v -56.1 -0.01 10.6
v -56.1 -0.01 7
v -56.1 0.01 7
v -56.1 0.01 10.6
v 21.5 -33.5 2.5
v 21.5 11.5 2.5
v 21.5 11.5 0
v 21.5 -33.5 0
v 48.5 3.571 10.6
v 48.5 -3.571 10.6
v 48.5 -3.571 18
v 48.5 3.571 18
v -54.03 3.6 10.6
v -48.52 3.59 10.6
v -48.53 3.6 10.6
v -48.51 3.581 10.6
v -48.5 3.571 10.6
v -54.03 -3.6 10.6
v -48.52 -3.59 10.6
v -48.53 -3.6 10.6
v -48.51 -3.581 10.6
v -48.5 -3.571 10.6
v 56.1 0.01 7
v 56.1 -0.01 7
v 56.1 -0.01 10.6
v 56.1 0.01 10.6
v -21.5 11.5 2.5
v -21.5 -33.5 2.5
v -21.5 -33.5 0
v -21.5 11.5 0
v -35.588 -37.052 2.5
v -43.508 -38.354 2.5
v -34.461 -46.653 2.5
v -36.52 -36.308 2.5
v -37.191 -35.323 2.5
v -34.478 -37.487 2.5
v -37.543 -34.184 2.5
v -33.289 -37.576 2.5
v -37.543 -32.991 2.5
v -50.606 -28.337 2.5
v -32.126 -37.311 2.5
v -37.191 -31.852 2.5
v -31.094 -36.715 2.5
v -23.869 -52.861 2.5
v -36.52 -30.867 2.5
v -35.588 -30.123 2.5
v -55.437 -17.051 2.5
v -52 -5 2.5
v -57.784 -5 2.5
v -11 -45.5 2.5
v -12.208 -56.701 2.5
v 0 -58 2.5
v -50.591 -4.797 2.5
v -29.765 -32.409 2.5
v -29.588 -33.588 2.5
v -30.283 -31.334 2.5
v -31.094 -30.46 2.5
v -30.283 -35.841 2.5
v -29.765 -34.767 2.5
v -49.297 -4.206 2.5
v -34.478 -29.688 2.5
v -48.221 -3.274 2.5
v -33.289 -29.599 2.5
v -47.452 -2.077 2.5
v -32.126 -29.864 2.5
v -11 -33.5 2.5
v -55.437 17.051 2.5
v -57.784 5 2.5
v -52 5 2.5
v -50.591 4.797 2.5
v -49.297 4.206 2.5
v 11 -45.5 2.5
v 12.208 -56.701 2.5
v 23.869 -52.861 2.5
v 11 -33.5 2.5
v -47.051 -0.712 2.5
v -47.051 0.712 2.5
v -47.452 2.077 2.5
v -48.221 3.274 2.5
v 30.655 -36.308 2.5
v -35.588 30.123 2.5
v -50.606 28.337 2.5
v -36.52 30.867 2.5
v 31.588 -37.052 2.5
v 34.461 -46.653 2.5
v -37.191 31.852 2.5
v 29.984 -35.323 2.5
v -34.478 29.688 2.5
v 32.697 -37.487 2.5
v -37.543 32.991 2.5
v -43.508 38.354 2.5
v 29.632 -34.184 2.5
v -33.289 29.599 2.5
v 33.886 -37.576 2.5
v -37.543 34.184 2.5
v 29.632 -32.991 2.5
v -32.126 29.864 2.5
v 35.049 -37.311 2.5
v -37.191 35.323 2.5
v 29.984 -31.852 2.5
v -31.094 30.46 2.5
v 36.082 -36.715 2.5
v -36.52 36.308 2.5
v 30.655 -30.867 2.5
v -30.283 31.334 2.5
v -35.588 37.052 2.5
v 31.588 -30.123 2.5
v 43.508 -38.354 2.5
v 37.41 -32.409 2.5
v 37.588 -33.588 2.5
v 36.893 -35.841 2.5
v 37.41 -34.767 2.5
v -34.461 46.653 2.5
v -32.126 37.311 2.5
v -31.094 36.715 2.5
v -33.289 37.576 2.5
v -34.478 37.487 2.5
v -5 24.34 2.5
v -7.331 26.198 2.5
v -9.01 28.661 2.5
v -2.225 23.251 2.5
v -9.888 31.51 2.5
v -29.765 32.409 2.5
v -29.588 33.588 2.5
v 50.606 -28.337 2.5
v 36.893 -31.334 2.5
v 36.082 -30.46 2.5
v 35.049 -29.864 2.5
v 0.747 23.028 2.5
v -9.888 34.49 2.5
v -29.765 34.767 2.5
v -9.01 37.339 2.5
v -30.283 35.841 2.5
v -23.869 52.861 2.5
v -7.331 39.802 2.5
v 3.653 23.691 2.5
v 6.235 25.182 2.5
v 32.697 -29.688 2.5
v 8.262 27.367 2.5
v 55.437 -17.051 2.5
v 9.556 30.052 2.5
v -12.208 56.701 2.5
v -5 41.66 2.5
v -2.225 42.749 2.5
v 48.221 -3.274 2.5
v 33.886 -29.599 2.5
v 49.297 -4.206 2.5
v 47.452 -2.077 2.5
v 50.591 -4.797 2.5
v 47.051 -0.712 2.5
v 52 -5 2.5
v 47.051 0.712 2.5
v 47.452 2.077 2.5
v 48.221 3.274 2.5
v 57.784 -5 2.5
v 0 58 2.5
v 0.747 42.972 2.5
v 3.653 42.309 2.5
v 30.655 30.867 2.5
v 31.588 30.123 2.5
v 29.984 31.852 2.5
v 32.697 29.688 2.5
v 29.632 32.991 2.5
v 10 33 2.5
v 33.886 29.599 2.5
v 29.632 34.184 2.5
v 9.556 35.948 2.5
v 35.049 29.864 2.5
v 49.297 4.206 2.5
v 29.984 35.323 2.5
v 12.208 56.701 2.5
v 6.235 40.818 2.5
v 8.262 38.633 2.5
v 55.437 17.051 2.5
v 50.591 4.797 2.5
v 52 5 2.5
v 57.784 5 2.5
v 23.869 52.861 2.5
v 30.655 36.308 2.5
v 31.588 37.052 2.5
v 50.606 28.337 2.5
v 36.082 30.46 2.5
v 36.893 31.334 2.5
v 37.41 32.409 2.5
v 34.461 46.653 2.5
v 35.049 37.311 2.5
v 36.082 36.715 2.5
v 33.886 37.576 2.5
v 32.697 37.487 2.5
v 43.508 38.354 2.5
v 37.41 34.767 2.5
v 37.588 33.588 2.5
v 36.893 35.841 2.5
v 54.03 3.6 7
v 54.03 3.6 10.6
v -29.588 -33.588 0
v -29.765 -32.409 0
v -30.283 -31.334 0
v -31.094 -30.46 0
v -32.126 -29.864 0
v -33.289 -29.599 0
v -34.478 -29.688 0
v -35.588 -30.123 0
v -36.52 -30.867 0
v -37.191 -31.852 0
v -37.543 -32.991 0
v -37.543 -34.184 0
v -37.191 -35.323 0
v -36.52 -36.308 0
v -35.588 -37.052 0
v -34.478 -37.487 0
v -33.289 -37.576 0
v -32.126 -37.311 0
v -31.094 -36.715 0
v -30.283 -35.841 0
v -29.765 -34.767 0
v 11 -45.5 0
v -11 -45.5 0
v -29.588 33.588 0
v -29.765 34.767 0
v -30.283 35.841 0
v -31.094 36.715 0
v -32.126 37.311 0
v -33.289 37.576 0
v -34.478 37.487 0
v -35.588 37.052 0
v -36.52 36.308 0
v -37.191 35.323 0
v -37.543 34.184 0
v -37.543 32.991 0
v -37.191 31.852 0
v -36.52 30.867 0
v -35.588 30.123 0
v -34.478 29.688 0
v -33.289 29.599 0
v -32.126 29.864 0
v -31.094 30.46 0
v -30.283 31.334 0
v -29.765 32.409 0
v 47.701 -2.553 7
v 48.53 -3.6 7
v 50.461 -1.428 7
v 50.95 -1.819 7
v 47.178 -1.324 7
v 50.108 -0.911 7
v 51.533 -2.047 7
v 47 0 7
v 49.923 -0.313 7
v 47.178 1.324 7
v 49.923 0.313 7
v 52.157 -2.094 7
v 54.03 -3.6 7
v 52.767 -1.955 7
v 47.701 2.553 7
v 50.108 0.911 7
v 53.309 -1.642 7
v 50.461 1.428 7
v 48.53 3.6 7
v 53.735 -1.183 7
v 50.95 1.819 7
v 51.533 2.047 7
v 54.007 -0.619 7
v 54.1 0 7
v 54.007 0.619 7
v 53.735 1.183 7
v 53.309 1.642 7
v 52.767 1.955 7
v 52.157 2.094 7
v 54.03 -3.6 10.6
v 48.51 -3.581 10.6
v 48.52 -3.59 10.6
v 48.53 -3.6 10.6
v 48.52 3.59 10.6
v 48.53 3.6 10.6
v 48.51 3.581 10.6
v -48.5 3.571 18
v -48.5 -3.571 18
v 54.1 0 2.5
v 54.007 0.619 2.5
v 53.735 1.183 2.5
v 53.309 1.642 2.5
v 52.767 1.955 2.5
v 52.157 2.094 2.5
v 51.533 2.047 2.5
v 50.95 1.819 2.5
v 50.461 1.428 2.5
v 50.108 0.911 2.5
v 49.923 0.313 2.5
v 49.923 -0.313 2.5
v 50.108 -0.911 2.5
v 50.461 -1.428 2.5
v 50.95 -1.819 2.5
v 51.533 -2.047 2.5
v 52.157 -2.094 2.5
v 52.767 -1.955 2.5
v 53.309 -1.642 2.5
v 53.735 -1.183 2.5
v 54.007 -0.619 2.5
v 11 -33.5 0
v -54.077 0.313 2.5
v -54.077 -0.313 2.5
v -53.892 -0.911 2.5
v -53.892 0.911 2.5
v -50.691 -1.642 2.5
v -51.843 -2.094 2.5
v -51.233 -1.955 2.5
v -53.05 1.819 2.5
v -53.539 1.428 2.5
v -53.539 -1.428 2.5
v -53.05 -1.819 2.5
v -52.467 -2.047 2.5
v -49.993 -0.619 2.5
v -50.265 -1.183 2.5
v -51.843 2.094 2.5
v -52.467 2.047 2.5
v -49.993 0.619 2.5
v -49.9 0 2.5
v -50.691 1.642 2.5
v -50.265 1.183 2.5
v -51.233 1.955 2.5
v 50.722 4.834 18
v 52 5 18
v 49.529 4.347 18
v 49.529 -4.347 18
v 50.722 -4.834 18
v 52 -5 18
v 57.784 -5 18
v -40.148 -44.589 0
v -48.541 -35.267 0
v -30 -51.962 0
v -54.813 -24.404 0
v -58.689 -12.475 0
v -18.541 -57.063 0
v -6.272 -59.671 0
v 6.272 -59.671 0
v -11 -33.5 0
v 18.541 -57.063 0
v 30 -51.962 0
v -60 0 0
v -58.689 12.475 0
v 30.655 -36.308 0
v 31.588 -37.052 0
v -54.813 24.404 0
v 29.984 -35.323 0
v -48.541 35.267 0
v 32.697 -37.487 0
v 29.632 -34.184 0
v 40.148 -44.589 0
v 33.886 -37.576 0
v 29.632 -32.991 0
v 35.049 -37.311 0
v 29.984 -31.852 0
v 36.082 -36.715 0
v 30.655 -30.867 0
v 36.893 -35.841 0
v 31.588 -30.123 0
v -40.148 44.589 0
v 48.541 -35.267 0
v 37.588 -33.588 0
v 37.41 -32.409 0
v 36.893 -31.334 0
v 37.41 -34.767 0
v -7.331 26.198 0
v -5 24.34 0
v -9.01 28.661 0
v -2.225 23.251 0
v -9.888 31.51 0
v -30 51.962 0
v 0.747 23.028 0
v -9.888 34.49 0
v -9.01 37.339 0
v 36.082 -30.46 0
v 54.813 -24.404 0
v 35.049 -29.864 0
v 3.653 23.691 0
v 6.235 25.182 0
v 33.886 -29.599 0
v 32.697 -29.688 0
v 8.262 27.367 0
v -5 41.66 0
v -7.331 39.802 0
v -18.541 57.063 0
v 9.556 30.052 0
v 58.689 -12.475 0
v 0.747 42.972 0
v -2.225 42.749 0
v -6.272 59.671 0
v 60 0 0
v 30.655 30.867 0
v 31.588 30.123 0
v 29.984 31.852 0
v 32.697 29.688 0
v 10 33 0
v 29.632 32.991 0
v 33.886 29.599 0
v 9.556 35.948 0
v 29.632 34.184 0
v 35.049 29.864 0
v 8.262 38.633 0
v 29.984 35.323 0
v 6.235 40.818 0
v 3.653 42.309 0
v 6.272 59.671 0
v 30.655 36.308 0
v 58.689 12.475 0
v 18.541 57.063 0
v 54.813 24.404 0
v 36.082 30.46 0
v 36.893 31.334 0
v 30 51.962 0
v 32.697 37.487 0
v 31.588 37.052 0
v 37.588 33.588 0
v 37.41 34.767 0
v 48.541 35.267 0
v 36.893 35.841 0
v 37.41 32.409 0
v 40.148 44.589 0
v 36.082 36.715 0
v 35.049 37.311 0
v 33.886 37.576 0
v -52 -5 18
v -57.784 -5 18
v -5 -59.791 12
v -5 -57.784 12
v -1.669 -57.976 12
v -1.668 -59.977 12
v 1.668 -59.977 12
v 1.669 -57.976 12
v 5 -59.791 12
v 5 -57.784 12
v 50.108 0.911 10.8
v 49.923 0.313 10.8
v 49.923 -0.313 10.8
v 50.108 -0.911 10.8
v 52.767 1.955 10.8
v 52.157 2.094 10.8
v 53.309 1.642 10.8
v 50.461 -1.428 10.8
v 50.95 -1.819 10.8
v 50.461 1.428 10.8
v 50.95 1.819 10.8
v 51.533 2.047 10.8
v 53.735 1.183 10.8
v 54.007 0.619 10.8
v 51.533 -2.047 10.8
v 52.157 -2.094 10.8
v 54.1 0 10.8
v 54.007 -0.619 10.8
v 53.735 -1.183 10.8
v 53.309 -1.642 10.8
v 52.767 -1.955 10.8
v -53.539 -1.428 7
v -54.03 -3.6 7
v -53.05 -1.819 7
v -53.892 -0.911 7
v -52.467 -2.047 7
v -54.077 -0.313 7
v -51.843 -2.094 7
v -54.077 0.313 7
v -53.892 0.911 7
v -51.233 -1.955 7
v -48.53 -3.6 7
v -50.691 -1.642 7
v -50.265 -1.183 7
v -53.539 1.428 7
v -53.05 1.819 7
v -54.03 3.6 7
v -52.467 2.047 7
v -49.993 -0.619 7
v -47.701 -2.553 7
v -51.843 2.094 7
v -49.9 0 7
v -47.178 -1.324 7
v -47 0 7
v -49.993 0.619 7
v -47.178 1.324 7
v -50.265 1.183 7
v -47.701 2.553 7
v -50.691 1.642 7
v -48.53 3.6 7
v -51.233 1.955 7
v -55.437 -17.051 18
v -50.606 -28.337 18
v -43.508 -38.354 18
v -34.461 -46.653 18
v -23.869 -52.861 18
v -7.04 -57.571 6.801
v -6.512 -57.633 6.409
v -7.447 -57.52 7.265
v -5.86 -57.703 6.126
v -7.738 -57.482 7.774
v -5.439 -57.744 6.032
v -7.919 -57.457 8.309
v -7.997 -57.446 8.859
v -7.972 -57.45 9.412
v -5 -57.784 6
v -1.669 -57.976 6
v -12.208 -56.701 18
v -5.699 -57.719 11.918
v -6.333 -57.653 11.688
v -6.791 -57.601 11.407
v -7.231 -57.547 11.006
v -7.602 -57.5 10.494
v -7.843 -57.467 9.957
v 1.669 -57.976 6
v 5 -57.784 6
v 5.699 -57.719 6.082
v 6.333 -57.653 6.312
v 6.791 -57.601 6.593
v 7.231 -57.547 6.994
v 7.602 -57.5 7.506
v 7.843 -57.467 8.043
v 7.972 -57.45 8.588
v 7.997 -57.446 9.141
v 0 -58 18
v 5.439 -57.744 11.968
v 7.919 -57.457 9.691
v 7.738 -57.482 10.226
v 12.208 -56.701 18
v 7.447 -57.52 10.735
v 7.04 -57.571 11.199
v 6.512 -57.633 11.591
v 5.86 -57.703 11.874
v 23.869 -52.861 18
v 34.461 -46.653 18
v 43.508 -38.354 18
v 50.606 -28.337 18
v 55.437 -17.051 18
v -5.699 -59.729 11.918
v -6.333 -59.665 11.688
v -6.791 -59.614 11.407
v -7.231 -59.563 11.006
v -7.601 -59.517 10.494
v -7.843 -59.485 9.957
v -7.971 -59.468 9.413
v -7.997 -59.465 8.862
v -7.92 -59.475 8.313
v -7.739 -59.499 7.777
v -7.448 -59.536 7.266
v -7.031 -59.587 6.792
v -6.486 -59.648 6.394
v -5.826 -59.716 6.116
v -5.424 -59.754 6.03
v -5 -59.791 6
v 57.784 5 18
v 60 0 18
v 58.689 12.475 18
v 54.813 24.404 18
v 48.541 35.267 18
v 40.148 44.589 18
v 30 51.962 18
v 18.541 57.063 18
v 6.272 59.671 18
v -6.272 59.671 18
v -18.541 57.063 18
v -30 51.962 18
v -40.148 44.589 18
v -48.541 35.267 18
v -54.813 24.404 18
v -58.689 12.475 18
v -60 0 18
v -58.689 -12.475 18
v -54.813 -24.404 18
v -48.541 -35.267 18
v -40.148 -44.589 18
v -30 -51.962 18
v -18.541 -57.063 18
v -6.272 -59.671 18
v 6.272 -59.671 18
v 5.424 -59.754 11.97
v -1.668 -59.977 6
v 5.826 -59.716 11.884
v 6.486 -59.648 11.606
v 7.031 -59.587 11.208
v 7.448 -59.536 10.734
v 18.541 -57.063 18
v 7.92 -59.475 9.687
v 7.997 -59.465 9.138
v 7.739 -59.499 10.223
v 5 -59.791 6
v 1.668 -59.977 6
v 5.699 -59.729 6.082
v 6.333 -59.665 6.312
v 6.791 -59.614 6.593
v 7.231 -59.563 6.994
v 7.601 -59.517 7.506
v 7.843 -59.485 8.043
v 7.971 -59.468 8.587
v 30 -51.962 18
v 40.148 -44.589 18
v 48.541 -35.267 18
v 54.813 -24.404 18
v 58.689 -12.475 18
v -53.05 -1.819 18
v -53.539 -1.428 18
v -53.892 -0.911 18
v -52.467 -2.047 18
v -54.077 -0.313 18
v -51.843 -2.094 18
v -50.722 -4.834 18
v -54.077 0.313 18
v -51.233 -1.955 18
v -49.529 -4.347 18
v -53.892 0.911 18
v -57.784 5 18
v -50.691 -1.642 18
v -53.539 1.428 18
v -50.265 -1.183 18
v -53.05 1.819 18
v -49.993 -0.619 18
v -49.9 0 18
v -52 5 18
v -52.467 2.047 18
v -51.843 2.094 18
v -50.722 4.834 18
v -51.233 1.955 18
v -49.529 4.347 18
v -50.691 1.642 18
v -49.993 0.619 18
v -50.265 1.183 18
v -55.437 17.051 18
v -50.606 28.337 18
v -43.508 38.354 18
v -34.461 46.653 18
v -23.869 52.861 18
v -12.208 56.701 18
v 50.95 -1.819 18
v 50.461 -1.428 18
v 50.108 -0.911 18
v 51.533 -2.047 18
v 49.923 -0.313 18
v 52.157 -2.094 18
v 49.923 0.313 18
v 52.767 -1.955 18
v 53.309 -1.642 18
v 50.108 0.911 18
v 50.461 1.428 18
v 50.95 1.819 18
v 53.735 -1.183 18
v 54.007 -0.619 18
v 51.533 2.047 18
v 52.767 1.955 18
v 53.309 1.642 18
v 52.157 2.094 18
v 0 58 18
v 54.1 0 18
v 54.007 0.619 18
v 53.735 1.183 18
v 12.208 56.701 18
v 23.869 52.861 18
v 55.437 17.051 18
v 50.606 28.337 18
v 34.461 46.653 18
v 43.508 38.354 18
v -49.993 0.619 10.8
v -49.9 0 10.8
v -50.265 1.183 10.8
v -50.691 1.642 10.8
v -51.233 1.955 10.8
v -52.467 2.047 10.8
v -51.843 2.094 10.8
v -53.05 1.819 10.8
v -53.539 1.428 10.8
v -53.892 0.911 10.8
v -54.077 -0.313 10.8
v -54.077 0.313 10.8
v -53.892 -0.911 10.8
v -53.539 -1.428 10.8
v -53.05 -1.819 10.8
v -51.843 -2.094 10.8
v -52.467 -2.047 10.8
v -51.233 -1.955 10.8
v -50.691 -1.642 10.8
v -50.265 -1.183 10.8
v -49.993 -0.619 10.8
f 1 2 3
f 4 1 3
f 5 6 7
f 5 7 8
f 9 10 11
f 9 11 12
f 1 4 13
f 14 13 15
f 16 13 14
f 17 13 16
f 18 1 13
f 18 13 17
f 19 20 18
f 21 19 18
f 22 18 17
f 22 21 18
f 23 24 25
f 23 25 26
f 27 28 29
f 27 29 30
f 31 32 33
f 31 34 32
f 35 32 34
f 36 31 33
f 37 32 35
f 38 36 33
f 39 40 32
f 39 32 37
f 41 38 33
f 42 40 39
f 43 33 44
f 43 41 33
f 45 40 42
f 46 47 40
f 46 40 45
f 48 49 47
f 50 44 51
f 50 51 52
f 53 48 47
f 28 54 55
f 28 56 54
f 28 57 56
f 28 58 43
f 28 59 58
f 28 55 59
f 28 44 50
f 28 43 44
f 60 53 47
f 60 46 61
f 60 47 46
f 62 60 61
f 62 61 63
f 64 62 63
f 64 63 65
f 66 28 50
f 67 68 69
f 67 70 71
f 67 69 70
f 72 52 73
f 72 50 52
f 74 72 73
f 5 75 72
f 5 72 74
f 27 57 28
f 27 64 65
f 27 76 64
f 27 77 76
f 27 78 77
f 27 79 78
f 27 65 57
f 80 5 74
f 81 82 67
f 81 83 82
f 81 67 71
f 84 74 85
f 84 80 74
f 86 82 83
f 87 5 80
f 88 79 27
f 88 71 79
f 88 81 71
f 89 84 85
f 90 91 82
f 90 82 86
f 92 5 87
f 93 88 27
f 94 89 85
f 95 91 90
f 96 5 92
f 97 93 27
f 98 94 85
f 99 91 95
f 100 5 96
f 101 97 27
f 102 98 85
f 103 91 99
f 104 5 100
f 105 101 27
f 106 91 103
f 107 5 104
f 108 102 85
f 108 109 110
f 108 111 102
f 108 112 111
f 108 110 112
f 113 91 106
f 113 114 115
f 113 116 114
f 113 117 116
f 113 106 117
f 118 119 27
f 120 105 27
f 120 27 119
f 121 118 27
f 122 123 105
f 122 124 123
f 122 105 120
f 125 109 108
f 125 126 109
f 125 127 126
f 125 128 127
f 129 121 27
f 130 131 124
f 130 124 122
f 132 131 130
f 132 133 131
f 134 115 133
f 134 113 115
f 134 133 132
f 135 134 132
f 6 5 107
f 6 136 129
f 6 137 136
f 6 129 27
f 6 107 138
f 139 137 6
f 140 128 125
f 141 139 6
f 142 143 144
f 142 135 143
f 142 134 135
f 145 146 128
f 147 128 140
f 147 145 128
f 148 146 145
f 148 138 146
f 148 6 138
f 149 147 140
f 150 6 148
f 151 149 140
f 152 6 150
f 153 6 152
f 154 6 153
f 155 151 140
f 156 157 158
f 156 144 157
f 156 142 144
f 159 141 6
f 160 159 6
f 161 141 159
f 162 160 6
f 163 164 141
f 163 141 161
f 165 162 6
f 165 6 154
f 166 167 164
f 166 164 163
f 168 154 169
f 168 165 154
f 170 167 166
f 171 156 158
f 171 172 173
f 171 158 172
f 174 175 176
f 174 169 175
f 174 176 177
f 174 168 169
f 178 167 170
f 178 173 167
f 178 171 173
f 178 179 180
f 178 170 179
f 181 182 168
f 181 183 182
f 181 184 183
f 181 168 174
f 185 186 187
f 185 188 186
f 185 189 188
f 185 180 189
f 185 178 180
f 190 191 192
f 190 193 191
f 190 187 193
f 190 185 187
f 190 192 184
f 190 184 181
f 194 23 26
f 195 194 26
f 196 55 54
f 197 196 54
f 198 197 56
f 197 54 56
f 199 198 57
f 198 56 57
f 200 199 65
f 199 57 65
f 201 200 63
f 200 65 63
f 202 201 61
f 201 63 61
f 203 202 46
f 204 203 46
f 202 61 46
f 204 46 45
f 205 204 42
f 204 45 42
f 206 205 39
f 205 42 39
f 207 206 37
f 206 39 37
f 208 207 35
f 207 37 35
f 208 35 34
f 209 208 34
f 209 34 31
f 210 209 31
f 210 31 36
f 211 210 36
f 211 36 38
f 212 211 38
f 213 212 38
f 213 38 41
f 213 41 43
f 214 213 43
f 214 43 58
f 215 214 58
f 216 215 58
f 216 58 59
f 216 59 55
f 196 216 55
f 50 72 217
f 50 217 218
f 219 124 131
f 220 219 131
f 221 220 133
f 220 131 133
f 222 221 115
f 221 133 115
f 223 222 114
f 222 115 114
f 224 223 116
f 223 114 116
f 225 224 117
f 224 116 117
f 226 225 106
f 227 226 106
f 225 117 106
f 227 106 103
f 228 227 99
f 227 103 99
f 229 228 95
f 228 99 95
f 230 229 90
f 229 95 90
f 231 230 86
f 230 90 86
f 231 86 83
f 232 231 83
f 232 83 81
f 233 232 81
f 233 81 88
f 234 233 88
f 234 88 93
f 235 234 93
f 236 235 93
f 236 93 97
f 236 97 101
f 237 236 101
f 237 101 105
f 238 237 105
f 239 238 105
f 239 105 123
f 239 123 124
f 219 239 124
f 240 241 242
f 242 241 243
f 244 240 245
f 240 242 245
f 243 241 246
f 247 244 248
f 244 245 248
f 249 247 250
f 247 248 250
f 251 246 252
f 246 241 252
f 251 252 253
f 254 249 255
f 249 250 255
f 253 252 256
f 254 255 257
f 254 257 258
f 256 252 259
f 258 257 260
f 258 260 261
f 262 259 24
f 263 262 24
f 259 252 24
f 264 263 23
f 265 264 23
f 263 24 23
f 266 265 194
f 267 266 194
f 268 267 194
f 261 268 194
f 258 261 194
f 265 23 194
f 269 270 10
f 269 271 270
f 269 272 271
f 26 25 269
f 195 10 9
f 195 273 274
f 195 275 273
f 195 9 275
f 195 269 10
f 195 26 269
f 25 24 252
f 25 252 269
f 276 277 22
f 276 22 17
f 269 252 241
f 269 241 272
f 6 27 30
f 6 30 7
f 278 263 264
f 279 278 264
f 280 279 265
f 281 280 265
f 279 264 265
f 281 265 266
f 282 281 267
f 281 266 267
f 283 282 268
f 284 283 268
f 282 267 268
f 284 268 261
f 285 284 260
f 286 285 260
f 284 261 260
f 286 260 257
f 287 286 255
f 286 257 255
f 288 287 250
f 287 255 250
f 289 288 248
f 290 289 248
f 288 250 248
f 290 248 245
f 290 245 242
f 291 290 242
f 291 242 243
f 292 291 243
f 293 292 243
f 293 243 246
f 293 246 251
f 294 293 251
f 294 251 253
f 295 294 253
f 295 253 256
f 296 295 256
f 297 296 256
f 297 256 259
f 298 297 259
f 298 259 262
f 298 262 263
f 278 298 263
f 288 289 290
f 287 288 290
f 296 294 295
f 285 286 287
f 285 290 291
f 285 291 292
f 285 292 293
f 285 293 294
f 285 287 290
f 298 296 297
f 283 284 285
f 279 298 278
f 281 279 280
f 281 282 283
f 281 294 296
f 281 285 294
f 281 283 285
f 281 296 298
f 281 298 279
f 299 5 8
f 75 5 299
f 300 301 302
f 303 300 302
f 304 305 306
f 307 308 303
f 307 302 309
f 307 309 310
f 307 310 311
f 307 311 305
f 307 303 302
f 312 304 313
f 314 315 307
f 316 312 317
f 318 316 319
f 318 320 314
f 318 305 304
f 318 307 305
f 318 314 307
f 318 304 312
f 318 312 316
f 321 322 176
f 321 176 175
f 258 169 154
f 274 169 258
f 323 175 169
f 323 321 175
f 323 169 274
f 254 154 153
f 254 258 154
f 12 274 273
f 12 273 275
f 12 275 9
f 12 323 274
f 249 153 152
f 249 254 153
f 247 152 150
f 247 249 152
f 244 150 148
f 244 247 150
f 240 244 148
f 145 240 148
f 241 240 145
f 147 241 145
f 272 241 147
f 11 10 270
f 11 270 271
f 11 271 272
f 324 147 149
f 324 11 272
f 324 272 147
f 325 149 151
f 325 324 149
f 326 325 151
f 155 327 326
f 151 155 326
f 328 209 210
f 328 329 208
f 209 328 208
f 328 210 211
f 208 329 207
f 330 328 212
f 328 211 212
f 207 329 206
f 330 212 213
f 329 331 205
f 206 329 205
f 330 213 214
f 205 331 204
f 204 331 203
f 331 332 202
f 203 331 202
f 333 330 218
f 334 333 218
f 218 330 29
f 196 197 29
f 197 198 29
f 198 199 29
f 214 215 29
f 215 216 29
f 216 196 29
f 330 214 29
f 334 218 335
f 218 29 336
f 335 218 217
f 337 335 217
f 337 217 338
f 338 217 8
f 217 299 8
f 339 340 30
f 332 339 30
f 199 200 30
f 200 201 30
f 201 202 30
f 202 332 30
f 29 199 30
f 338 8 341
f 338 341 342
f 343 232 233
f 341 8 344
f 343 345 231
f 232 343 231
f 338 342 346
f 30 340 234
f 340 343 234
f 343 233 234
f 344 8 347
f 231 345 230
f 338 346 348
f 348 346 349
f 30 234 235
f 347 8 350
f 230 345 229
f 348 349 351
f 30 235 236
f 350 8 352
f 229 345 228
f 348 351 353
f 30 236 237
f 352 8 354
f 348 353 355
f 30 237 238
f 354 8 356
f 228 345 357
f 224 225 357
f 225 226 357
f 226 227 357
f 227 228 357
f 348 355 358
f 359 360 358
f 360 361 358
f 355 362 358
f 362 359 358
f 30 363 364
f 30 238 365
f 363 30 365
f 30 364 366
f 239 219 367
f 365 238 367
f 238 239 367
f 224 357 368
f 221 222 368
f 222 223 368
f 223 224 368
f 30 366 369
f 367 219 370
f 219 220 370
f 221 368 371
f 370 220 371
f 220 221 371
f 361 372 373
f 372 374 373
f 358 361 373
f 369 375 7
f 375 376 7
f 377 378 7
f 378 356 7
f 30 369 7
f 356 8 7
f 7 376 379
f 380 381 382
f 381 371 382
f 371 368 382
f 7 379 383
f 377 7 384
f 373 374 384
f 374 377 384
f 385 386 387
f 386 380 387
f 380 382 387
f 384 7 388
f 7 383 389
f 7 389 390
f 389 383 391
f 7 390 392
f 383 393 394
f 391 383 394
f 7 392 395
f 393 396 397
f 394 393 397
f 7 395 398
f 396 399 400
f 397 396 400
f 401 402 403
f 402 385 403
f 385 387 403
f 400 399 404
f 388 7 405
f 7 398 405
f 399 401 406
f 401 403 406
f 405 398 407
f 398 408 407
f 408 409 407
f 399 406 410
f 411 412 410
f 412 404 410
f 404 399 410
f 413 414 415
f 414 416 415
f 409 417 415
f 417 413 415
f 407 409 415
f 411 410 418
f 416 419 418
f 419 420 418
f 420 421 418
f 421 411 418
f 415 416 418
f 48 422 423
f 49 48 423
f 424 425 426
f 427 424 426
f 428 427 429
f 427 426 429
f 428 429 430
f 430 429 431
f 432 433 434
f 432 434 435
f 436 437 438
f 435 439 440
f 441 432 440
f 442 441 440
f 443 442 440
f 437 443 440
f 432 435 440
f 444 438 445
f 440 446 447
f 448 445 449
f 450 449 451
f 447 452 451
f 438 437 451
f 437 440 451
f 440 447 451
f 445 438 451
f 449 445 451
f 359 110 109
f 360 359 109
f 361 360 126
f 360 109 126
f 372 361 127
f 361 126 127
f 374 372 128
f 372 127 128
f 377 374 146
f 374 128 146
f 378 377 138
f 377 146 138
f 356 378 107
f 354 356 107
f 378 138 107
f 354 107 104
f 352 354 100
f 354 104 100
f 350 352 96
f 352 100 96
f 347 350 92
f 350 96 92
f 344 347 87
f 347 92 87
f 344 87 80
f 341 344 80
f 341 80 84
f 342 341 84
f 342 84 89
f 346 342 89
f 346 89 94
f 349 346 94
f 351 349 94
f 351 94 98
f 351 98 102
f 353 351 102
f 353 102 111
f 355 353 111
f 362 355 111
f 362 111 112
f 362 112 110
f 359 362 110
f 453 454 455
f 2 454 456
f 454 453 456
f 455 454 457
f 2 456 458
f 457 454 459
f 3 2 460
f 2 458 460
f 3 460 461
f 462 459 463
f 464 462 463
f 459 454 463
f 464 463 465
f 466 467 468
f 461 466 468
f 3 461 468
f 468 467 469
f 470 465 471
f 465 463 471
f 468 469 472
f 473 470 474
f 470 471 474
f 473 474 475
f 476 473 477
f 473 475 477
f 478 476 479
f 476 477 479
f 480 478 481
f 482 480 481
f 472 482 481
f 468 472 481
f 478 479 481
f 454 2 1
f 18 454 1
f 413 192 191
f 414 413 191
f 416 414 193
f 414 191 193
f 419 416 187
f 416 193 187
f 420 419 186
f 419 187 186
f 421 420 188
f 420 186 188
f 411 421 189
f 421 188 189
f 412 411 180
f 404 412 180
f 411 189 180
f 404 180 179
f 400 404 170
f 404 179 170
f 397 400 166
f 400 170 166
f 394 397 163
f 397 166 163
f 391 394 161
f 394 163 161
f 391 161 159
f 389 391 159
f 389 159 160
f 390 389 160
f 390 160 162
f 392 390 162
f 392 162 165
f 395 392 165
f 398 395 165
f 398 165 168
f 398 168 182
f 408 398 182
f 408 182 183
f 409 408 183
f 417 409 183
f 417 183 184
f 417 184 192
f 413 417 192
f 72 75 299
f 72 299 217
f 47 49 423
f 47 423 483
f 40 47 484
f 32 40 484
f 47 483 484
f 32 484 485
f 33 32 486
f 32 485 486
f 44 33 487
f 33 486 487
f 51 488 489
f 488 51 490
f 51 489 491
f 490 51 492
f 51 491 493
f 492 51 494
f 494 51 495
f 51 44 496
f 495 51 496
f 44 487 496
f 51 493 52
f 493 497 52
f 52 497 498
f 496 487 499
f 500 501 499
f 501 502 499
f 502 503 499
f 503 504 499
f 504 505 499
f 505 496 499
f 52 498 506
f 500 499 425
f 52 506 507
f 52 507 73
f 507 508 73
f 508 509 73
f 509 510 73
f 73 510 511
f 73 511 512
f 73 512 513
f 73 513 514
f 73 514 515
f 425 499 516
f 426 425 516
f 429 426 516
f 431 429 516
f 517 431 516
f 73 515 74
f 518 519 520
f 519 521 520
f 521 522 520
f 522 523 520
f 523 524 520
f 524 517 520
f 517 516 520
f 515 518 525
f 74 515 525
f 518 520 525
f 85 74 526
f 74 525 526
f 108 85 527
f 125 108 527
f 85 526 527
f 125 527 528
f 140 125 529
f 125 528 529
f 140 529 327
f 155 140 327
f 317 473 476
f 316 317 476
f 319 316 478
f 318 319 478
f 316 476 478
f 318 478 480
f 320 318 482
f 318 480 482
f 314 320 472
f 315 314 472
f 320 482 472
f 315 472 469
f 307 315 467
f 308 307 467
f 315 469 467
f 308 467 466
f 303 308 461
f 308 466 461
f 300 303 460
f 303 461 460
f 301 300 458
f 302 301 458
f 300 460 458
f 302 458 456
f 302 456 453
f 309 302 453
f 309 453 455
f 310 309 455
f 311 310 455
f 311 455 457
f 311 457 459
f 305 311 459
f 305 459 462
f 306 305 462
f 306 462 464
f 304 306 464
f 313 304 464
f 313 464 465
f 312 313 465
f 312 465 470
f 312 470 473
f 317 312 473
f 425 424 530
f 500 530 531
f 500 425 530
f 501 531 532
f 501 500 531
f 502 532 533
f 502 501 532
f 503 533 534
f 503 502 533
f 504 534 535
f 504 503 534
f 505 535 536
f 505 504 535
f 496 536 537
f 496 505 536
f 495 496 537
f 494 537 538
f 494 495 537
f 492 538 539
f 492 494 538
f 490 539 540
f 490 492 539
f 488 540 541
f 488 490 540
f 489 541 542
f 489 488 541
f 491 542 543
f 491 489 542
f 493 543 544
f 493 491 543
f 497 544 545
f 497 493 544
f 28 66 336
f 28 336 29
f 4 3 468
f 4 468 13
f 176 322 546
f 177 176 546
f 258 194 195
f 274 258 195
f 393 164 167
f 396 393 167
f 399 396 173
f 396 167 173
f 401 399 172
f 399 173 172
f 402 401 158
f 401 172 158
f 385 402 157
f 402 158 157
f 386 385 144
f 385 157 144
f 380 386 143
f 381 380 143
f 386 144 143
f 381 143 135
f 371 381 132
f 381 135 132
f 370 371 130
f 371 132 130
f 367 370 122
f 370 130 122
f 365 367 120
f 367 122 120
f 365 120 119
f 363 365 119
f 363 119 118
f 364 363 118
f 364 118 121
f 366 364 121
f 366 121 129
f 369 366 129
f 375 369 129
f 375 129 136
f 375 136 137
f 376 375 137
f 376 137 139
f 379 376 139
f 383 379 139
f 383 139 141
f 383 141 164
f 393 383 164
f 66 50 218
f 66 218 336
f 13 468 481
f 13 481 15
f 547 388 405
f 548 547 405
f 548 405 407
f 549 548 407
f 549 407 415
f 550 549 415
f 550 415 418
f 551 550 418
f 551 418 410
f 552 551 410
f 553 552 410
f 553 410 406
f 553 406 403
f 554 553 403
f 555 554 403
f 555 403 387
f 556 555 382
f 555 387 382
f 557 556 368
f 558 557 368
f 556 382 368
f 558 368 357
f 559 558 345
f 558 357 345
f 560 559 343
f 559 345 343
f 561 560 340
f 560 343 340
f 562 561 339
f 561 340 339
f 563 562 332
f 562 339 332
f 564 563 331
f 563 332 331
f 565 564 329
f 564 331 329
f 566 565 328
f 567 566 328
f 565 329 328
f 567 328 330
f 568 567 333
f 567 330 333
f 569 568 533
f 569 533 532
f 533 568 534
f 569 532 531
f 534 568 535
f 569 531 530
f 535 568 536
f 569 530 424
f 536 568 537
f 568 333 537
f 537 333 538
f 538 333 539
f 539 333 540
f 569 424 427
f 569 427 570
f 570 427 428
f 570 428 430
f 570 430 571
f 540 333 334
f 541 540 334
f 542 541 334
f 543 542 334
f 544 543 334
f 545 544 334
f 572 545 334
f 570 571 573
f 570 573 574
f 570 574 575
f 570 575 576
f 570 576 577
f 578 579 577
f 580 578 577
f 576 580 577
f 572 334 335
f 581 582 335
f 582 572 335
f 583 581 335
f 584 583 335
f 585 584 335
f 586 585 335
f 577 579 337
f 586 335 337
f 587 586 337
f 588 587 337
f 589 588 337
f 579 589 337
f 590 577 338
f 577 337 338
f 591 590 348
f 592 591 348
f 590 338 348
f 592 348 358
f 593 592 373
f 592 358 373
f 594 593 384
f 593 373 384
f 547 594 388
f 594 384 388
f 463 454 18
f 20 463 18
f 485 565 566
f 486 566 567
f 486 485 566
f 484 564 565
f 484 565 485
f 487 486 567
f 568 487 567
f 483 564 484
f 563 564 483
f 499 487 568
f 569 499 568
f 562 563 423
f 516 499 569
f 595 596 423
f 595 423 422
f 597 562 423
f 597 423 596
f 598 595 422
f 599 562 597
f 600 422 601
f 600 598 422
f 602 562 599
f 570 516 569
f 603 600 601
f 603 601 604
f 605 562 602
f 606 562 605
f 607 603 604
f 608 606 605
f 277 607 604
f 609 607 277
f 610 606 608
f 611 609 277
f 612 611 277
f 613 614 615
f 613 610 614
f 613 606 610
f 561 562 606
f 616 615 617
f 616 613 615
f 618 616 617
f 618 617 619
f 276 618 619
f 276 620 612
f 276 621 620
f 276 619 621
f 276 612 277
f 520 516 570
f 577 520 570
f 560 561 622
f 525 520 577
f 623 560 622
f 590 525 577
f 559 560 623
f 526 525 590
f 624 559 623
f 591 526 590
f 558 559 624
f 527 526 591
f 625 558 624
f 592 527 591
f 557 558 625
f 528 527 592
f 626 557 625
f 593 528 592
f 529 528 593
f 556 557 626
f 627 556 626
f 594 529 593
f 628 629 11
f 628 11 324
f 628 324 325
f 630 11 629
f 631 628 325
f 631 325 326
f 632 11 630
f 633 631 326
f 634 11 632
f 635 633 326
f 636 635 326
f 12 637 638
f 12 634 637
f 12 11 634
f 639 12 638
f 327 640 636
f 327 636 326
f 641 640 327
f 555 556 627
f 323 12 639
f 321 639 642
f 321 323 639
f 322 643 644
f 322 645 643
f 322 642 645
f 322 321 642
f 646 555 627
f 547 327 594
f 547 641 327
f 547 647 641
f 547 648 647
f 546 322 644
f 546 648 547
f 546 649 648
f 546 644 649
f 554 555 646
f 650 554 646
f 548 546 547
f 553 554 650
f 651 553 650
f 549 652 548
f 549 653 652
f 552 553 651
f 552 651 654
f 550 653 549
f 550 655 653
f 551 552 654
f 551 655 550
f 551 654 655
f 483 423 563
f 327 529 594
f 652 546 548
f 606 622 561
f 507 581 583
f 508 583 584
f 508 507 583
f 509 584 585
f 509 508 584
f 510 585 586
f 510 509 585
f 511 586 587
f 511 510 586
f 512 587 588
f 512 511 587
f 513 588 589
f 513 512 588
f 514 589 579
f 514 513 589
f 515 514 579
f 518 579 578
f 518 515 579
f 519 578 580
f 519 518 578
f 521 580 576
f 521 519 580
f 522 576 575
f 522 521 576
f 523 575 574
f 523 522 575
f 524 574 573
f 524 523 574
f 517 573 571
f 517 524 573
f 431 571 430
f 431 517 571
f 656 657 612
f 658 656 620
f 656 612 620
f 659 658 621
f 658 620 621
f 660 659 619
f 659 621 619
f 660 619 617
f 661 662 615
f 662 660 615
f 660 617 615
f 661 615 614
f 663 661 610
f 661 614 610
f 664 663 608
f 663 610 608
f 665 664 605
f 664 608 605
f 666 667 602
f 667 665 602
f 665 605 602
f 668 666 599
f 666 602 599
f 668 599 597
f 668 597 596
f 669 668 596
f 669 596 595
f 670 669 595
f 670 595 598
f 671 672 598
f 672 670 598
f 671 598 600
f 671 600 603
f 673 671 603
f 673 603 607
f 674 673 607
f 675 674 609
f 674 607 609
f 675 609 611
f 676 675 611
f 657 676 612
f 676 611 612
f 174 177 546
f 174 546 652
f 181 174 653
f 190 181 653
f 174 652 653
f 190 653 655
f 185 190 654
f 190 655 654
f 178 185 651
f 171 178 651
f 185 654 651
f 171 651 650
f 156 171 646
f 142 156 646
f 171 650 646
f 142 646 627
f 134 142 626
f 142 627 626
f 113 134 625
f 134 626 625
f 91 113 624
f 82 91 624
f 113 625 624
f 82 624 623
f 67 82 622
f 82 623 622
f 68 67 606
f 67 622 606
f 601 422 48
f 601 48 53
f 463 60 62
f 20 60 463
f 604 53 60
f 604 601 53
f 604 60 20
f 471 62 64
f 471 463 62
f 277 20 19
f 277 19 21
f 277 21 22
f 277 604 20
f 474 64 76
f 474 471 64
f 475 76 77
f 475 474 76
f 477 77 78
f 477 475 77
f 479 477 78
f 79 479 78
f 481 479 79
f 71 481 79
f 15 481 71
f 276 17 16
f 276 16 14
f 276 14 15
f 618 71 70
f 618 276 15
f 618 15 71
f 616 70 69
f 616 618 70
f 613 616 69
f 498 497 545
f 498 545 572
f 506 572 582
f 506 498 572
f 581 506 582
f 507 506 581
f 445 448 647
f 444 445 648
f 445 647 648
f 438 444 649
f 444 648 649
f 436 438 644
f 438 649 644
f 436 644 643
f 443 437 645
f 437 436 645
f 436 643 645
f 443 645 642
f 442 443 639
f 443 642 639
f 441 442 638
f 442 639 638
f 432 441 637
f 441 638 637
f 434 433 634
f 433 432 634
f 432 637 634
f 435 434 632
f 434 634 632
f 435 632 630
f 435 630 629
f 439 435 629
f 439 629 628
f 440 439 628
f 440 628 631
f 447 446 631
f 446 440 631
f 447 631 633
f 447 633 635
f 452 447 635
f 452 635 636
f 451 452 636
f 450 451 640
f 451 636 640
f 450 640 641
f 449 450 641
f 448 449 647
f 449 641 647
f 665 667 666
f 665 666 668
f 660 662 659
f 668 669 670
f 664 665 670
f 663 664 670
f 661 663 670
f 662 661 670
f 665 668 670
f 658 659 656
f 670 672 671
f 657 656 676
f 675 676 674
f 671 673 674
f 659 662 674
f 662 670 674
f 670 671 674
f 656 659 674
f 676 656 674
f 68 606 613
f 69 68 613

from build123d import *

# Parameters (mm, degrees)
SKETCH_R        = 60
PAD_DEPTH       = 18
SKETCH001_R     = 2.1
POCKET_DEPTH    = 15.5
SKETCH002_W     = 7.2
SKETCH002_H     = 3.6
POCKET001_DEPTH = 56.1
CHAMFER_1_SIZE2 = 3.59
CHAMFER_1_SIZE  = 2.07
CHAMFER_2_SIZE2 = 3.59
CHAMFER_2_SIZE  = 2.07
CHAMFER_3_SIZE2 = 3.59
CHAMFER_3_SIZE  = 2.07
CHAMFER_4_SIZE2 = 3.59
CHAMFER_4_SIZE  = 2.07
SKETCH003_R     = 4
SKETCH003_R_2   = 10
POCKET002_DEPTH = 2.501
POCKET003_DEPTH = 60
SKETCH005_R     = 2.1
PAD001_DEPTH    = 0.2
SKETCH006_W     = 97
SKETCH006_H     = 10
POCKET004_DEPTH = 10.99


with BuildPart() as part:
    # Sketch → Pad (new body)
    with BuildSketch(Plane.XY):
        Circle(SKETCH_R)
    extrude(amount=PAD_DEPTH)

    # Sketch001 (on Face3 of Pad) → Pocket (cut)
    with BuildSketch(Plane.XY.offset(18)):
        with Locations((-52, 0)):
            Circle(SKETCH001_R)
        with Locations((52, 0)):
            Circle(SKETCH001_R)
        with BuildLine():
            ThreePointArc((-57.784081, -5), (0, -58), (57.784081, -5))
            Line((57.784081, -5), (52, -5))
            ThreePointArc((52, 5), (47, 0), (52, -5))
            Line((52, 5), (57.784081, 5))
            ThreePointArc((57.784081, 5), (0, 58), (-57.784081, 5))
            Line((-57.784081, 5), (-52, 5))
            ThreePointArc((-52, -5), (-47, 0), (-52, 5))
            Line((-52, -5), (-57.784081, -5))
        make_face()
    extrude(amount=-POCKET_DEPTH, mode=Mode.SUBTRACT)

    # Sketch002 → Pocket001 (cut, symmetric)
    with BuildSketch(Plane.YZ):
        with Locations((0, 8.8)):
            Rectangle(SKETCH002_W, SKETCH002_H)
    extrude(amount=POCKET001_DEPTH, both=True, mode=Mode.SUBTRACT)

    # Chamfer 1
    chamfer_1_edges = [part.edges().sort_by_distance(p)[0] for p in [
        (-56.1, -3.6, 8.8),
    ]]
    chamfer_1_side = part.faces().sort_by_distance((-52.315065, -3.6, 8.8))[0]
    chamfer(chamfer_1_edges, length=CHAMFER_1_SIZE, length2=CHAMFER_1_SIZE2, reference=chamfer_1_side)

    # Chamfer 2
    chamfer_2_edges = [part.edges().sort_by_distance(p)[0] for p in [
        (-56.1, 3.6, 8.8),
    ]]
    chamfer_2_side = part.faces().sort_by_distance((-52.315065, 3.6, 8.8))[0]
    chamfer(chamfer_2_edges, length=CHAMFER_2_SIZE, length2=CHAMFER_2_SIZE2, reference=chamfer_2_side)

    # Chamfer 3
    chamfer_3_edges = [part.edges().sort_by_distance(p)[0] for p in [
        (56.1, 3.6, 8.8),
    ]]
    chamfer_3_side = part.faces().sort_by_distance((52.315065, 3.6, 8.8))[0]
    chamfer(chamfer_3_edges, length=CHAMFER_3_SIZE, length2=CHAMFER_3_SIZE2, reference=chamfer_3_side)

    # Chamfer 4
    chamfer_4_edges = [part.edges().sort_by_distance(p)[0] for p in [
        (56.1, -3.6, 8.8),
    ]]
    chamfer_4_side = part.faces().sort_by_distance((52.315065, -3.6, 8.8))[0]
    chamfer(chamfer_4_edges, length=CHAMFER_4_SIZE, length2=CHAMFER_4_SIZE2, reference=chamfer_4_side)

    # Sketch003 (on Face12 of Chamfer) → Pocket002 (cut, through all)
    with BuildSketch(Plane.XY.offset(2.5)):
        with Locations((-33.587572, 33.587572)):
            Circle(SKETCH003_R)
        with Locations((33.587572, -33.587572)):
            Circle(SKETCH003_R)
        with Locations((33.587572, 33.587572)):
            Circle(SKETCH003_R)
        with Locations((-33.587572, -33.587572)):
            Circle(SKETCH003_R)
        with Locations((0, 33)):
            Circle(SKETCH003_R_2)
        Polygon((-21.5, 11.5), (21.5, 11.5), (21.5, -33.5), (11, -33.5), (11, -45.5), (-11, -45.5), (-11, -33.5), (-21.5, -33.5), align=None)
    extrude(amount=-POCKET002_DEPTH, mode=Mode.SUBTRACT)

    # Sketch004 (on Face10 of Pocket002) → Pocket003 (cut)
    with BuildSketch(Plane.XZ.offset(5)):
        with BuildLine():
            ThreePointArc((-5, 12), (-8, 9), (-5, 6))
            Line((-5, 6), (5, 6))
            ThreePointArc((5, 6), (8, 9), (5, 12))
            Line((-5, 12), (5, 12))
        make_face()
    extrude(amount=POCKET003_DEPTH, mode=Mode.SUBTRACT)

    # Sketch005 (on Face1 of Pocket003) → Pad001 (join)
    with BuildSketch(Plane(origin=(0, 0, 10.6), x_dir=(1, 0, 0), z_dir=(0, 0, -1))):
        with Locations((-52, 0)):
            Circle(SKETCH005_R)
        with Locations((52, 0)):
            Circle(SKETCH005_R)
    extrude(amount=-PAD001_DEPTH)

    # Sketch006 (on Face11 of Pad001) → Pocket004 (cut)
    with BuildSketch(Plane.XY.offset(18)):
        Rectangle(SKETCH006_W, SKETCH006_H)
    extrude(amount=-POCKET004_DEPTH, mode=Mode.SUBTRACT)


solid = part.part
